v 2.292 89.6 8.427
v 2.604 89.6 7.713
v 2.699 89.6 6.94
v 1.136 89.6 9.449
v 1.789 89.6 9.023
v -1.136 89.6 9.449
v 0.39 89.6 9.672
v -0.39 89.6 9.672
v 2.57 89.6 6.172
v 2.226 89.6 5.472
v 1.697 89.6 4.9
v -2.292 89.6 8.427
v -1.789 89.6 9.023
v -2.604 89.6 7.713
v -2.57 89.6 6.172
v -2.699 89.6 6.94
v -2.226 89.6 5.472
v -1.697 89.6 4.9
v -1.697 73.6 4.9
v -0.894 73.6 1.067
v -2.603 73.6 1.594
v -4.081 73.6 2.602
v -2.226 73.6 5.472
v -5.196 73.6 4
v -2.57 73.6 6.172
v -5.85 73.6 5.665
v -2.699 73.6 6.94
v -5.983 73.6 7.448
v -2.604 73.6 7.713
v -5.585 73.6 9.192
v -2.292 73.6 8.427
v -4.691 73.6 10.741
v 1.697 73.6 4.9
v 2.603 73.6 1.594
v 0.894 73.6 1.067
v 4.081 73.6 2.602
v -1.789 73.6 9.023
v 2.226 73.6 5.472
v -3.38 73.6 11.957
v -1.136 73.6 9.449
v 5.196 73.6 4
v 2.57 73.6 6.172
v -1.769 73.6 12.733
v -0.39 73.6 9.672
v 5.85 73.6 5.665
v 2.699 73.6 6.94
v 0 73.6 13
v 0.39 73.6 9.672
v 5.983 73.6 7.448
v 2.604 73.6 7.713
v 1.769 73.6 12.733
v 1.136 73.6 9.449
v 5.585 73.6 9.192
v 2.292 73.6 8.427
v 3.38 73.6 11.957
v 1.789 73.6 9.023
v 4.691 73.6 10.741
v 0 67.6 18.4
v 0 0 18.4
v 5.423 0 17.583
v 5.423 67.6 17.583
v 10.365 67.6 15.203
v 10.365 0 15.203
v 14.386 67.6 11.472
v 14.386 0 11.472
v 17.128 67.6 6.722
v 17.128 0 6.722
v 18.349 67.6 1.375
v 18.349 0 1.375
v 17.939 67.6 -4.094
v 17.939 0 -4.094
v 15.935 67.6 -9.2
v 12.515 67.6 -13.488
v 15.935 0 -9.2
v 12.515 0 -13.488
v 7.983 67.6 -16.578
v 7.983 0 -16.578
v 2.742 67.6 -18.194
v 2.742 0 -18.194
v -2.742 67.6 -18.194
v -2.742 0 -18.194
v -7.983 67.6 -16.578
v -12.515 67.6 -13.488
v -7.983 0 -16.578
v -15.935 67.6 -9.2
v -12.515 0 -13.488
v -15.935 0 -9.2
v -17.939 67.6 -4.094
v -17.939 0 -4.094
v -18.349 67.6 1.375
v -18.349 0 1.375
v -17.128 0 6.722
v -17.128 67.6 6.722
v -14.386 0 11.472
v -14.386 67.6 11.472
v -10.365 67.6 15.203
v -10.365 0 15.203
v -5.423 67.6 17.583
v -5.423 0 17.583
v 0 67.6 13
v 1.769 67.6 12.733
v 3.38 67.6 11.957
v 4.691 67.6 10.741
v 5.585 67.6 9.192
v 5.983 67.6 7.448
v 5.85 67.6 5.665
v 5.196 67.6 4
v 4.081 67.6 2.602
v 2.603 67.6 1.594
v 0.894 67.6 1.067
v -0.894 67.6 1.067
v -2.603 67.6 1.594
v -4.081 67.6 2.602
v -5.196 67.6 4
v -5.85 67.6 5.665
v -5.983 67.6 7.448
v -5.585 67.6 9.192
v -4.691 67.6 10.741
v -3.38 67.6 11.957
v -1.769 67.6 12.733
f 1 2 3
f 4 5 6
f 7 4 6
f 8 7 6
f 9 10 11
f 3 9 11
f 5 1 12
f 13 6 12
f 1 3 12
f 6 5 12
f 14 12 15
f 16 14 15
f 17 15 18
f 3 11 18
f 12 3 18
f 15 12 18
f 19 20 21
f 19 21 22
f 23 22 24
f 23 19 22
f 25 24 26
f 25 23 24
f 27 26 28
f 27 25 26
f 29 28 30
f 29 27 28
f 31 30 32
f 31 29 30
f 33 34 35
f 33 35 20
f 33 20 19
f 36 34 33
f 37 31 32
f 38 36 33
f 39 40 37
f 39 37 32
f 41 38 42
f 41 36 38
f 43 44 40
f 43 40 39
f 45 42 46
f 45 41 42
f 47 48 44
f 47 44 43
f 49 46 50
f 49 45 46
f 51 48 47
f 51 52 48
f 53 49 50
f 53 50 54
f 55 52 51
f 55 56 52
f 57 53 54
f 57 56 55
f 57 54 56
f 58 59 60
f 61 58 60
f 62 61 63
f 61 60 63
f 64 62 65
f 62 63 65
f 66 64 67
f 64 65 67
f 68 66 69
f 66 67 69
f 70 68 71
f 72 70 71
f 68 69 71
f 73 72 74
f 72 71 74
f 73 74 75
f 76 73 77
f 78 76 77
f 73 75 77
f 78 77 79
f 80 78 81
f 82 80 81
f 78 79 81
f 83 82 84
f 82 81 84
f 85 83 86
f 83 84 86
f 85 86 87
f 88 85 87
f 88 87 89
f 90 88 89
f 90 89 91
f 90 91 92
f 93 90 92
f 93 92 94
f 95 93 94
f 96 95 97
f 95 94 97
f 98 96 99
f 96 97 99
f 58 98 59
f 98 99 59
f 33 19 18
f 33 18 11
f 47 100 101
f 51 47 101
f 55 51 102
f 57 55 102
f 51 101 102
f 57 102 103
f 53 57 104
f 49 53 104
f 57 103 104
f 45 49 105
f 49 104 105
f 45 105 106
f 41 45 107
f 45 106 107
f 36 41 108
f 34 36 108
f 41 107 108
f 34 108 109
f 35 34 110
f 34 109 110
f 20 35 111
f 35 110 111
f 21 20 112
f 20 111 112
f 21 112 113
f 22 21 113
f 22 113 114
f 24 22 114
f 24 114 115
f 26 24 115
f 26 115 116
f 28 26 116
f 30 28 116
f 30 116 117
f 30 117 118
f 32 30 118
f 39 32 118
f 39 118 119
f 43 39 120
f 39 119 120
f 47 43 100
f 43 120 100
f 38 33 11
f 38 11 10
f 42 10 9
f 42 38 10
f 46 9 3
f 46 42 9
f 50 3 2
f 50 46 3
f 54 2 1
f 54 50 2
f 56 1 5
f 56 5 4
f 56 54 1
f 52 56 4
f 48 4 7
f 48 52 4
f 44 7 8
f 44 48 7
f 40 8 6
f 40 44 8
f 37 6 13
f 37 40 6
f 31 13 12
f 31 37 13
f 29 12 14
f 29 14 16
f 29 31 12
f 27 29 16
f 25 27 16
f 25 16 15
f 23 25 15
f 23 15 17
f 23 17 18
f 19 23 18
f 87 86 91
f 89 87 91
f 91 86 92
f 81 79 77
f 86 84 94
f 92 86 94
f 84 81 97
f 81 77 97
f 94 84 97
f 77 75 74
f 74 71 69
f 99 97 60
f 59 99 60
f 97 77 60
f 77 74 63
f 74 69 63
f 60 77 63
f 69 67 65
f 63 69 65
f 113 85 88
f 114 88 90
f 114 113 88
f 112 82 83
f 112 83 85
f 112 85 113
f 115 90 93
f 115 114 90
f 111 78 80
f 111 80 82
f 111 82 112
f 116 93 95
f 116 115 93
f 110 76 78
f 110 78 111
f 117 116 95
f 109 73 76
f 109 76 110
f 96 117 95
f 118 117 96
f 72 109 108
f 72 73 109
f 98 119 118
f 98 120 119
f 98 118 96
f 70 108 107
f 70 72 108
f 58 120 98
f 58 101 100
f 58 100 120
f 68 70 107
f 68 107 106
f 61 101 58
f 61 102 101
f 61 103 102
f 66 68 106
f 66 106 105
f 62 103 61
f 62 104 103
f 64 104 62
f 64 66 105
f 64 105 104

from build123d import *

# Parameters (mm, degrees)
SKETCH1_R           = 18.4
BOSS_EXTRUDE1_DEPTH = 67.6
SKETCH2_R           = 6
BOSS_EXTRUDE2_DEPTH = 6
BOSS_EXTRUDE3_START = -6
BOSS_EXTRUDE3_DEPTH = 22


with BuildPart() as part:
    # Sketch1 → Boss-Extrude1 (new body)
    with BuildSketch(Plane(origin=(0, 0, 0), x_dir=(1, 0, 0), z_dir=(0, 1, 0))):
        with Locations(Location((0, 0, 0), (0, 0, 270))):
            Circle(SKETCH1_R)
    extrude(amount=BOSS_EXTRUDE1_DEPTH)

    # Sketch2 → Boss-Extrude2 (add)
    with BuildSketch(Plane(origin=(0, 67.6, 0), x_dir=(1, 0, 0), z_dir=(0, 1, 0))):
        with Locations(Location((0, -7, 0), (0, 0, 270))):
            Circle(SKETCH2_R)
    extrude(amount=BOSS_EXTRUDE2_DEPTH)

    # Sketch3 → Boss-Extrude3 (add)
    with BuildSketch(Plane(origin=(0, 73.6, 0), x_dir=(1, 0, 0), z_dir=(0, 1, 0)).offset(BOSS_EXTRUDE3_START)):
        with BuildLine():
            Line((-1.697056275, -4.9), (1.697056275, -4.9))
            ThreePointArc((1.697056275, -4.9), (0, -9.7), (-1.697056275, -4.9))
        make_face()
    extrude(amount=BOSS_EXTRUDE3_DEPTH)


solid = part.part
